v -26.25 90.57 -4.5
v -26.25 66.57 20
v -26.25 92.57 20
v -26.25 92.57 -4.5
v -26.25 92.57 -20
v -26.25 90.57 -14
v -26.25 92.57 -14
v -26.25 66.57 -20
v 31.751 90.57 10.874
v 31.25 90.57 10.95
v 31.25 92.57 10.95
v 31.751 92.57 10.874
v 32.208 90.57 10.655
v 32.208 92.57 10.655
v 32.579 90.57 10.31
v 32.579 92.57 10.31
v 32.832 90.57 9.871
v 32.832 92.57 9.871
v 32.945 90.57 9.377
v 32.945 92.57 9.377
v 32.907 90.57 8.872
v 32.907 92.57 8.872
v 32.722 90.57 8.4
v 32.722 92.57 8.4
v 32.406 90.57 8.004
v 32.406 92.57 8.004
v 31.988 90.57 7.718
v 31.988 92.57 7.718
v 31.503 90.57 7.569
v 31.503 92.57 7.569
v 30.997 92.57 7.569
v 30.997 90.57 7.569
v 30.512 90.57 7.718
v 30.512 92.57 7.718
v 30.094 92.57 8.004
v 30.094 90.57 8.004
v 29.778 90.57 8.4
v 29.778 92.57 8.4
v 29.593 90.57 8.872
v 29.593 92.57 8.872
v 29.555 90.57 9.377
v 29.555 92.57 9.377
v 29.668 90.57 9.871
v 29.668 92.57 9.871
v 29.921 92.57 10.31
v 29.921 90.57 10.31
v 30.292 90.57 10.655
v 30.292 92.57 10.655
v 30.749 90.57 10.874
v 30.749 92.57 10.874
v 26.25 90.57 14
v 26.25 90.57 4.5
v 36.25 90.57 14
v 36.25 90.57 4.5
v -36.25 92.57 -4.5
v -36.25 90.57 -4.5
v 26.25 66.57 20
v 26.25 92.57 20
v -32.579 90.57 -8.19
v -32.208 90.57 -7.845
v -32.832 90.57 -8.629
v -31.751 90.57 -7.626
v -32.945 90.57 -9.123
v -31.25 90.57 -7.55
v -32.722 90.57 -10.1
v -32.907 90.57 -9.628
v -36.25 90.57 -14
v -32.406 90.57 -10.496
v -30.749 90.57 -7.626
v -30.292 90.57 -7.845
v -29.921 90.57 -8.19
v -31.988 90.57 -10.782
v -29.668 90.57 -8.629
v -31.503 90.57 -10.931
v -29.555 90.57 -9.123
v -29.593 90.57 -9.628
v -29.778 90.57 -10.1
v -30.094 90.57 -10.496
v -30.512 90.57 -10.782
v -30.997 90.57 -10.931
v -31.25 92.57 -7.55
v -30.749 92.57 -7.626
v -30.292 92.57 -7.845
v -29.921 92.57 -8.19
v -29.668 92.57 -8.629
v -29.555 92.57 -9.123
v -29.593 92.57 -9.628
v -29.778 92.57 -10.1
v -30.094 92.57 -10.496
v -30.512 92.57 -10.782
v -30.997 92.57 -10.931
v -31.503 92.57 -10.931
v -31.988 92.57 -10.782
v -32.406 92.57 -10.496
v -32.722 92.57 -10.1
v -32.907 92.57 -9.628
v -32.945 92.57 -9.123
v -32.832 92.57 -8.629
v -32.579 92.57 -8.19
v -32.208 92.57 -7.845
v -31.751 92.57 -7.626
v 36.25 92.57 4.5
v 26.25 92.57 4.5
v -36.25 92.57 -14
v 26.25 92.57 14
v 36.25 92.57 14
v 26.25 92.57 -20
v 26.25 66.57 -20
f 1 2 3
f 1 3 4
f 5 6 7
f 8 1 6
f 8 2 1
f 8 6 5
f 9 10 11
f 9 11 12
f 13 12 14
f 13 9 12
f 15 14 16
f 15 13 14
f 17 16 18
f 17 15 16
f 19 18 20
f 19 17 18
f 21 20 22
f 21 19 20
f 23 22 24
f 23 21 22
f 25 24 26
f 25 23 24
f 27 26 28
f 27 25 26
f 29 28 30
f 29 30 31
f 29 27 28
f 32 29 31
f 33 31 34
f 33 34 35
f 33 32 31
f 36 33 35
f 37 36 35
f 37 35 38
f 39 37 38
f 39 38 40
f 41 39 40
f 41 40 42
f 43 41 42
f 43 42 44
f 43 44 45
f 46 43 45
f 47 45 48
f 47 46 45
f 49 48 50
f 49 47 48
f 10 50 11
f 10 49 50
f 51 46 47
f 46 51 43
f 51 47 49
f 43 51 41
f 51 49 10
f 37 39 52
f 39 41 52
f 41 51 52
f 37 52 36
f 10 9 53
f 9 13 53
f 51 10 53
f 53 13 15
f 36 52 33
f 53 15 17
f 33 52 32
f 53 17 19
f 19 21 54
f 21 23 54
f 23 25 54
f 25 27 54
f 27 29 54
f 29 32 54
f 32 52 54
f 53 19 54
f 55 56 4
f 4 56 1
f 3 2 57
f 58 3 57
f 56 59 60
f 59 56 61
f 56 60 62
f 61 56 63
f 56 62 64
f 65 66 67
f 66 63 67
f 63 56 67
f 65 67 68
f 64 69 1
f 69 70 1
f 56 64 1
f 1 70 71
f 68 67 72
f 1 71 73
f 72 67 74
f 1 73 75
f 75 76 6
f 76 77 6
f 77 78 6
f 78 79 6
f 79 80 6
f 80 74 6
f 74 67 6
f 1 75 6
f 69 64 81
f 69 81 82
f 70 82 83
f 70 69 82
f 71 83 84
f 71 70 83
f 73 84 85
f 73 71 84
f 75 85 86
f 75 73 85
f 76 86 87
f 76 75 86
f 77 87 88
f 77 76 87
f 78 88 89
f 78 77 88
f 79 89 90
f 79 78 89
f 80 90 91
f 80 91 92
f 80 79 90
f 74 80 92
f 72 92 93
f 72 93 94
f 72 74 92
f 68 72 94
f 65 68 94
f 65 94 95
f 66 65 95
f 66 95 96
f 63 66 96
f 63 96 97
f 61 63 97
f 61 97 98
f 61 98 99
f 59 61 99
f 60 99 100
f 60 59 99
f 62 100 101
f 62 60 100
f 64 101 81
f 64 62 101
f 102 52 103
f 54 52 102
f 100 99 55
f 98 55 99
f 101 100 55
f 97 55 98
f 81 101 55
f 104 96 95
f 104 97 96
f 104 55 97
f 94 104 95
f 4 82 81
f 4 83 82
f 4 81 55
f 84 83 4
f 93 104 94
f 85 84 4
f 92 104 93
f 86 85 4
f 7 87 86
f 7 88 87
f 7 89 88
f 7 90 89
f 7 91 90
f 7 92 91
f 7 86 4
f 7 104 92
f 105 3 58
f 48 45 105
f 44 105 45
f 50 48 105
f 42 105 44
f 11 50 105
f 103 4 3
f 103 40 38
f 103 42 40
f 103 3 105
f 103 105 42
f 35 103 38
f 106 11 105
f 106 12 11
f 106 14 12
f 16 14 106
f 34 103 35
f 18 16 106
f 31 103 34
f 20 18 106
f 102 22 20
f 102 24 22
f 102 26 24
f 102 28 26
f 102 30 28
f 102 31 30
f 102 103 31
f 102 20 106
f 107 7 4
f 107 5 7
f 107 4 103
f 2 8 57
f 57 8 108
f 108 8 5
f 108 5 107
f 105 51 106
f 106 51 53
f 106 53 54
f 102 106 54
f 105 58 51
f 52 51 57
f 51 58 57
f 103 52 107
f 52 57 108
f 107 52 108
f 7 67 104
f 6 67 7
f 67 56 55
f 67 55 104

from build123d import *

# Parameters (mm, degrees)
CASE_START    = 66.57
CASE_SKETCH_W = 52.5
CASE_SKETCH_H = 40
CASE_2_DEPTH  = 26
EARS_START    = 90.57
EARS_SKETCH_W = 10
EARS_SKETCH_H = 9.5
EARS_SKETCH_R = 1.7
EARS_DEPTH    = 2


with BuildPart() as part:
    # Case Sketch → Case 2 (new body)
    with BuildSketch(Plane(origin=(0, 0, 0), x_dir=(1, 0, 0), z_dir=(0, 1, 0)).offset(CASE_START)):
        Rectangle(CASE_SKETCH_W, CASE_SKETCH_H)
    extrude(amount=CASE_2_DEPTH)

    # Ears Sketch → Ears (add)
    # profile 1 of 2: a face of its own
    with BuildSketch(Plane(origin=(0, 0, 0), x_dir=(1, 0, 0), z_dir=(0, 1, 0)).offset(EARS_START)):
        with Locations((31.25, -9.25)):
            Rectangle(EARS_SKETCH_W, EARS_SKETCH_H)
        with Locations((31.25, -9.25)):
            Circle(EARS_SKETCH_R, mode=Mode.SUBTRACT)
    # profile 2 of 2: a face of its own
    with BuildSketch(Plane(origin=(0, 0, 0), x_dir=(1, 0, 0), z_dir=(0, 1, 0)).offset(EARS_START)):
        with Locations((-31.25, 9.25)):
            Rectangle(EARS_SKETCH_W, EARS_SKETCH_H)
        with Locations((-31.25, 9.25)):
            Circle(EARS_SKETCH_R, mode=Mode.SUBTRACT)
    extrude(amount=EARS_DEPTH)


solid = part.part
